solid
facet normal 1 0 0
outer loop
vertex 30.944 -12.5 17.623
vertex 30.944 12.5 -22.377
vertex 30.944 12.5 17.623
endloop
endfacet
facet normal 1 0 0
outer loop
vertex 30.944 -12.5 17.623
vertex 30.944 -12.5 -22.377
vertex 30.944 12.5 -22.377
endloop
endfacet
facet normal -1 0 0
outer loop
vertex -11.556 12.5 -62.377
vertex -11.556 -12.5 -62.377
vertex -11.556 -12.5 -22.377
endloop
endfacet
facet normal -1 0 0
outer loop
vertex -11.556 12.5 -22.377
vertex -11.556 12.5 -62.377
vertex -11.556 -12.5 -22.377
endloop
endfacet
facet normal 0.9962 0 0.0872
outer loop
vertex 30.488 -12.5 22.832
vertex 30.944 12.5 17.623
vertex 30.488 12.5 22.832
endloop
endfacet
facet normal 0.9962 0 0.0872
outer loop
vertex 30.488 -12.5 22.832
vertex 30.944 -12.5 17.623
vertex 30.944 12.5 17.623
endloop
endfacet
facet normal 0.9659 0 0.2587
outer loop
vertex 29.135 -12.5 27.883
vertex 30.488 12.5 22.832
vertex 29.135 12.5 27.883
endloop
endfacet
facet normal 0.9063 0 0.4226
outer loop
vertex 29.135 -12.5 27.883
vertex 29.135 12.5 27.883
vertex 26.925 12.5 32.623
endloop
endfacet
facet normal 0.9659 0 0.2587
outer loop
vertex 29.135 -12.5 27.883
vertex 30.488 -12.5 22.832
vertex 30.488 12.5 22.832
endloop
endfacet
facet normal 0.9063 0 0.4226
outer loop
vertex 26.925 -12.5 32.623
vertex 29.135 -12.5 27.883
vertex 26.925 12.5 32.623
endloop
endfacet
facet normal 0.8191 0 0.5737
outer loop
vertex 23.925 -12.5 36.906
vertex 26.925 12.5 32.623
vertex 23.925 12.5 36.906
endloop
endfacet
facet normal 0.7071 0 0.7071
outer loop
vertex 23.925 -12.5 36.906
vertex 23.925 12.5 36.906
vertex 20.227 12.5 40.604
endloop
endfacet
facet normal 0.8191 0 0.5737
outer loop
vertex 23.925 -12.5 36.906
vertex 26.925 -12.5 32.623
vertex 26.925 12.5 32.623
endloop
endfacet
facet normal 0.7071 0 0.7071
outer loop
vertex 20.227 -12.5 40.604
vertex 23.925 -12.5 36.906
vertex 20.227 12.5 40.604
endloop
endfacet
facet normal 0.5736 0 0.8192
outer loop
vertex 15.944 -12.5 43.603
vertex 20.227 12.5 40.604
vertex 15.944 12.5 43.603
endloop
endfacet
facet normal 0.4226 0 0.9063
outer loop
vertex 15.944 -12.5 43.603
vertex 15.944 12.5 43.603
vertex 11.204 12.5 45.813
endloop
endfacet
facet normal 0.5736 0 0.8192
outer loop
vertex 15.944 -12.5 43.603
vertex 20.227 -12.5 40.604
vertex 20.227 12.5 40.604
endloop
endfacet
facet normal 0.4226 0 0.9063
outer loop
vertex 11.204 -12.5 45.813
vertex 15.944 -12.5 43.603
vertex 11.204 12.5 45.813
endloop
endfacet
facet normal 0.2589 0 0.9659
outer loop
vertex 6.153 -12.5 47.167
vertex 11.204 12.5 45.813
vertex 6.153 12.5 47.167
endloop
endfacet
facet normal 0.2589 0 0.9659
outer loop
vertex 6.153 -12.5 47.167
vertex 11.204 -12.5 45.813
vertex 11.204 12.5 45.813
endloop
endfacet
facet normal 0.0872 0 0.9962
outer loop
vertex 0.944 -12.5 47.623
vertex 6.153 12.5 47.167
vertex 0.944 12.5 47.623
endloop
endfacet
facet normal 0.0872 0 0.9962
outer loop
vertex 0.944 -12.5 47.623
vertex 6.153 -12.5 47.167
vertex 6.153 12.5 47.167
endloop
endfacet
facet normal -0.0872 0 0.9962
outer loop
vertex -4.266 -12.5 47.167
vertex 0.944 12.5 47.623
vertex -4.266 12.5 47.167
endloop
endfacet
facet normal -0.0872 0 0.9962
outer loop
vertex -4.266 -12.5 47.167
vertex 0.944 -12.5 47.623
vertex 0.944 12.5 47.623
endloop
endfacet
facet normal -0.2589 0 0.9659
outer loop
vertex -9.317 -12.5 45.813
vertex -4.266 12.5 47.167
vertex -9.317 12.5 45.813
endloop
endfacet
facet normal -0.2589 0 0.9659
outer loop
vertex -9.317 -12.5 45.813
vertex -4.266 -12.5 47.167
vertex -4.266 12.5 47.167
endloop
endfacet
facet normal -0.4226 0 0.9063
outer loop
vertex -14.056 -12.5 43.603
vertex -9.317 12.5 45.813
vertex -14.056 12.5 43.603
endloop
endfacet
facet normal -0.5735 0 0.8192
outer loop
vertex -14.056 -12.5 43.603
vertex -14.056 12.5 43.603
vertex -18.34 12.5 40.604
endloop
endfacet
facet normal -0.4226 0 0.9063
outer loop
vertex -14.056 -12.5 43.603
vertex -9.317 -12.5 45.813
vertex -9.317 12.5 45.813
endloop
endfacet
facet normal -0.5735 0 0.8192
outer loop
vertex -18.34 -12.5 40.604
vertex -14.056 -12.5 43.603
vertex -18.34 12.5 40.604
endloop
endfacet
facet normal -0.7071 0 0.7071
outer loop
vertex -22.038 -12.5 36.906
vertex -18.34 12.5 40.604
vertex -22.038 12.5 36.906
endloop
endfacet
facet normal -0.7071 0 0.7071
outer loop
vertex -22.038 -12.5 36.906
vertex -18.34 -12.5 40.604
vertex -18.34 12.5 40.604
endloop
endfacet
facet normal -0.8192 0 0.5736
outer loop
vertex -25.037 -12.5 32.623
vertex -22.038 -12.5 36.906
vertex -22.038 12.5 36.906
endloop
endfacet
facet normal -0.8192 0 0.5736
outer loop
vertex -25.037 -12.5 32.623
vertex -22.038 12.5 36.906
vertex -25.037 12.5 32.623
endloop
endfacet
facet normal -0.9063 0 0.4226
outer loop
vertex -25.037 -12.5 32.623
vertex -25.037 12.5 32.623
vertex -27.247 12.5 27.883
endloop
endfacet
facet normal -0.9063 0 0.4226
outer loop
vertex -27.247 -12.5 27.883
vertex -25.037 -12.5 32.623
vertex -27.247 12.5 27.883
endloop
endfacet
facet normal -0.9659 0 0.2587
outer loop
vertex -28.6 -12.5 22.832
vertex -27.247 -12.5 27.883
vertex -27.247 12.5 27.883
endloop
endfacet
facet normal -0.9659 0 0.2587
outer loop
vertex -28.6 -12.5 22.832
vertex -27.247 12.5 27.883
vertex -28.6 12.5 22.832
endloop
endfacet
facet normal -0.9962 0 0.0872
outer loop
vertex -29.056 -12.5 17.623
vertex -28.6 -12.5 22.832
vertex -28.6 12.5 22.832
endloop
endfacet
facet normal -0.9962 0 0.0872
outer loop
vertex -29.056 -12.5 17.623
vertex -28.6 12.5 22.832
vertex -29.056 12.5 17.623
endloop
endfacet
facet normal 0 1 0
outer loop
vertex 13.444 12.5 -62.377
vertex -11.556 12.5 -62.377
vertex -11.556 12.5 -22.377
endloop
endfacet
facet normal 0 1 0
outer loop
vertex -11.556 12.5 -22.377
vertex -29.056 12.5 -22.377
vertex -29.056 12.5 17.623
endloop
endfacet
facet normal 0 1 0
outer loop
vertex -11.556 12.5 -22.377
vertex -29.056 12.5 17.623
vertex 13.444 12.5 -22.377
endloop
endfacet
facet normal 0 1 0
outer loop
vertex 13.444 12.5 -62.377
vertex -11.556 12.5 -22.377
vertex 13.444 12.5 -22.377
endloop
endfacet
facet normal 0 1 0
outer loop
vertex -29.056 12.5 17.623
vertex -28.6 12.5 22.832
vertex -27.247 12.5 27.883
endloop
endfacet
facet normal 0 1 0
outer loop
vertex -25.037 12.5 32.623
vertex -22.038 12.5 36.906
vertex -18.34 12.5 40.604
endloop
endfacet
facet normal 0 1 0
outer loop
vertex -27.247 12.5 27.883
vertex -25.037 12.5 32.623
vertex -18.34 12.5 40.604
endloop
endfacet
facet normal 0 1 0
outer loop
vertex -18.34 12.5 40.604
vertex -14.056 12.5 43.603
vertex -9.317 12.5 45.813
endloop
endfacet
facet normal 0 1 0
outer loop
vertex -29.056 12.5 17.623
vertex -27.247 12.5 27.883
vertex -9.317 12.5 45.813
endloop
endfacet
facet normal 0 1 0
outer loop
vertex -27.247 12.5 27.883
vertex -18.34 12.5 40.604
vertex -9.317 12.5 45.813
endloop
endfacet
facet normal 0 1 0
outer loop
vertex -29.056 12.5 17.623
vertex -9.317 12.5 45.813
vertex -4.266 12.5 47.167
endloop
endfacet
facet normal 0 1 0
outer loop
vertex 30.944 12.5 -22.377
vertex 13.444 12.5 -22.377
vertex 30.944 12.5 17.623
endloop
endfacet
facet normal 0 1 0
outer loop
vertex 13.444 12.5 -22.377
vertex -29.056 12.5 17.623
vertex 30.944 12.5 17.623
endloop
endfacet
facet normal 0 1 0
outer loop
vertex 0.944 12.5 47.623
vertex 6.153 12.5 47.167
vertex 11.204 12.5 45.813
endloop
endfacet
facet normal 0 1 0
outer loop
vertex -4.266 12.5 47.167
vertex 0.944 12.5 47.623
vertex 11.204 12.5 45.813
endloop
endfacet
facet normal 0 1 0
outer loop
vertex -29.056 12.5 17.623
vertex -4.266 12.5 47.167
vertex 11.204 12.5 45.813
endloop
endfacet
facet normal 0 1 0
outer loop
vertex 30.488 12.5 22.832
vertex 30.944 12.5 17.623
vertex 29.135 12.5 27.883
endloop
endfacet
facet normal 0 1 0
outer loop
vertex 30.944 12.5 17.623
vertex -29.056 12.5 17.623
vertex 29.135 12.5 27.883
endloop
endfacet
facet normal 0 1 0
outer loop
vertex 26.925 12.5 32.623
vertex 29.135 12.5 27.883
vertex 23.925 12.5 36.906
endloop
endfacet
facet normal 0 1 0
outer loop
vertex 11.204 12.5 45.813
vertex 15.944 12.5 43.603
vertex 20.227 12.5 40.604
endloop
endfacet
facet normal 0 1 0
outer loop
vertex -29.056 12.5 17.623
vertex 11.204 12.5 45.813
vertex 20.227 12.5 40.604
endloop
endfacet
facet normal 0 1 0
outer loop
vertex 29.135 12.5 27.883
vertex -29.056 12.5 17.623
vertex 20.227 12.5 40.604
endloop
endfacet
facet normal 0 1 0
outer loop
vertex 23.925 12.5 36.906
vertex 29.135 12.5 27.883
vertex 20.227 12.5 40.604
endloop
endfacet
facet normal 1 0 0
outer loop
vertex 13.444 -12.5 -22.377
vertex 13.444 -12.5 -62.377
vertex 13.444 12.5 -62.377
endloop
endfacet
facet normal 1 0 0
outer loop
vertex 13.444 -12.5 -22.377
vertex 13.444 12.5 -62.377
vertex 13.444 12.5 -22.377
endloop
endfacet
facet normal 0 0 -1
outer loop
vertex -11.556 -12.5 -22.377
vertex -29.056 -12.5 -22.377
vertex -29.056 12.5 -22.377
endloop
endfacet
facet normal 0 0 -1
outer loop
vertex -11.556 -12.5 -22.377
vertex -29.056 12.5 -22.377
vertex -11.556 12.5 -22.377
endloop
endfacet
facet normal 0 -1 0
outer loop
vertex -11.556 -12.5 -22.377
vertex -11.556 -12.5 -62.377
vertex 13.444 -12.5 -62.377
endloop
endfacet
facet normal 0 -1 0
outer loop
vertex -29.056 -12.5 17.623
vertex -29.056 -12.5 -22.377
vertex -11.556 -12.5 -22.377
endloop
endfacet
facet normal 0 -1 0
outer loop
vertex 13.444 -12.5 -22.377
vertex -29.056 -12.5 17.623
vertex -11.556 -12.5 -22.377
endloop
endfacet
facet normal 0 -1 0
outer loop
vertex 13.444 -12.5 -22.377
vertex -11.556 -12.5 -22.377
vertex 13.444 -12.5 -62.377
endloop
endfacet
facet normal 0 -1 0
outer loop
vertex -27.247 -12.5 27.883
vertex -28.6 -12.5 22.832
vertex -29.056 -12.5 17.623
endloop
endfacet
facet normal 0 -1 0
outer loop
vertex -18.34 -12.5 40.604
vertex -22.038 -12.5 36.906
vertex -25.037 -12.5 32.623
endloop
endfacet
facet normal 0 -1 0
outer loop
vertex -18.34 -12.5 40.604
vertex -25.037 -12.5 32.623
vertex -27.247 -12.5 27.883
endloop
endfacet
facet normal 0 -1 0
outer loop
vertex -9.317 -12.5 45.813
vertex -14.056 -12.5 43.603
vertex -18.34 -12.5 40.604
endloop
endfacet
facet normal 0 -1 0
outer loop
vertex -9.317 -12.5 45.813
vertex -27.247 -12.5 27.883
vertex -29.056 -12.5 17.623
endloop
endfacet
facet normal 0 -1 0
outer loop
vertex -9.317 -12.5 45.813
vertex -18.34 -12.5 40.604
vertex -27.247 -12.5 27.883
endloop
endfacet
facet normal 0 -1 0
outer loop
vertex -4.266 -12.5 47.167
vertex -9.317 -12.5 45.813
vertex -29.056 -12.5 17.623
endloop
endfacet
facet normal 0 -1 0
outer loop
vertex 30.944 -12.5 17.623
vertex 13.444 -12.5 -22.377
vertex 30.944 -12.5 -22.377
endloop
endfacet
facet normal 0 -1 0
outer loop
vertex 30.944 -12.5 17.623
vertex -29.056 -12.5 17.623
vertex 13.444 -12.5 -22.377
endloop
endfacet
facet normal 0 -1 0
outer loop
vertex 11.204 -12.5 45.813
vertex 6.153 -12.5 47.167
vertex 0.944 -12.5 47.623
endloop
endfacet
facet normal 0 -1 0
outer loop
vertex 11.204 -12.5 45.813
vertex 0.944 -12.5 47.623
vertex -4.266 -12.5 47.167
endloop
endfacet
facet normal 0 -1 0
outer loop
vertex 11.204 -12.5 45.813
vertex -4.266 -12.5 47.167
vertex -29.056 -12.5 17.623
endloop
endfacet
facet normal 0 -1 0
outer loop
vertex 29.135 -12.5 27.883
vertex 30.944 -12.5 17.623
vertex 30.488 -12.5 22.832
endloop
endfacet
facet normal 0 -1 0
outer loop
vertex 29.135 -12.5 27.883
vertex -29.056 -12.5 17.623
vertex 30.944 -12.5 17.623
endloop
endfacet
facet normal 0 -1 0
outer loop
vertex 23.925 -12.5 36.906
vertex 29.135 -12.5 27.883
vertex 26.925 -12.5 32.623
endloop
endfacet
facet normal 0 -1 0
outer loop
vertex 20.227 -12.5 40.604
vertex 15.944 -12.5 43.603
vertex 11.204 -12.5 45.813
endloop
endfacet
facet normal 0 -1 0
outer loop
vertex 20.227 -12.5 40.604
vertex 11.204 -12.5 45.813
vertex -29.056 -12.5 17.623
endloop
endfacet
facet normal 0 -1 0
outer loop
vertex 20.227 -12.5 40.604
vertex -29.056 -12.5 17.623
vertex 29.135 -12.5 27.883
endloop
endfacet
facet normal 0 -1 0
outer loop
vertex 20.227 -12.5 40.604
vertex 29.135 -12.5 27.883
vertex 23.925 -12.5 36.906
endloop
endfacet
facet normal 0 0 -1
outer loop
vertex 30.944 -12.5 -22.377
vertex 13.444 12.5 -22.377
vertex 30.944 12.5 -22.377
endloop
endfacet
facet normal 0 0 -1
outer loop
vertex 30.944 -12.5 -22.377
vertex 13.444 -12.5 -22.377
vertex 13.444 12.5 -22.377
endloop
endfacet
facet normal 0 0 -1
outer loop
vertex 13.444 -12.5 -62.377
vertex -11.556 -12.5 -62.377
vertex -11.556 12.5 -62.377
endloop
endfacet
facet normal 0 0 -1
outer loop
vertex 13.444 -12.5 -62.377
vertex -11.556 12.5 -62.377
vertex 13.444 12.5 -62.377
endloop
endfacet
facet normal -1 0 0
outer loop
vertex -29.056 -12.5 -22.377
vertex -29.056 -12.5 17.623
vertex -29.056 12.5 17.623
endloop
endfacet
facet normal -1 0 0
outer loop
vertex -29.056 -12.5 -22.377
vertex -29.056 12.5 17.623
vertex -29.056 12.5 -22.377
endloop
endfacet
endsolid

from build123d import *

# Parameters (mm, degrees)
F0_W     = 25
F0_H     = 40
F1_DEPTH = 12.5


with BuildPart() as f1:
    # F0 (on Front) → F1 (new body, symmetric)
    with BuildSketch(Plane.XZ):
        with BuildLine():
            ThreePointArc((30.943819, 17.62255), (0.943819, 47.62255), (-29.056181, 17.62255))
            Line((-29.056181, 17.62255), (30.943819, 17.62255))
        make_face()
        Polygon((30.943819, 17.62255), (-29.056181, 17.62255), (-29.056181, -22.37745), (-11.556181, -22.37745), (13.443819, -22.37745), (30.943819, -22.37745), align=None)
        with Locations((0.943819, -42.37745)):
            Rectangle(F0_W, F0_H)
    extrude(amount=F1_DEPTH, both=True)


solid = f1.part
